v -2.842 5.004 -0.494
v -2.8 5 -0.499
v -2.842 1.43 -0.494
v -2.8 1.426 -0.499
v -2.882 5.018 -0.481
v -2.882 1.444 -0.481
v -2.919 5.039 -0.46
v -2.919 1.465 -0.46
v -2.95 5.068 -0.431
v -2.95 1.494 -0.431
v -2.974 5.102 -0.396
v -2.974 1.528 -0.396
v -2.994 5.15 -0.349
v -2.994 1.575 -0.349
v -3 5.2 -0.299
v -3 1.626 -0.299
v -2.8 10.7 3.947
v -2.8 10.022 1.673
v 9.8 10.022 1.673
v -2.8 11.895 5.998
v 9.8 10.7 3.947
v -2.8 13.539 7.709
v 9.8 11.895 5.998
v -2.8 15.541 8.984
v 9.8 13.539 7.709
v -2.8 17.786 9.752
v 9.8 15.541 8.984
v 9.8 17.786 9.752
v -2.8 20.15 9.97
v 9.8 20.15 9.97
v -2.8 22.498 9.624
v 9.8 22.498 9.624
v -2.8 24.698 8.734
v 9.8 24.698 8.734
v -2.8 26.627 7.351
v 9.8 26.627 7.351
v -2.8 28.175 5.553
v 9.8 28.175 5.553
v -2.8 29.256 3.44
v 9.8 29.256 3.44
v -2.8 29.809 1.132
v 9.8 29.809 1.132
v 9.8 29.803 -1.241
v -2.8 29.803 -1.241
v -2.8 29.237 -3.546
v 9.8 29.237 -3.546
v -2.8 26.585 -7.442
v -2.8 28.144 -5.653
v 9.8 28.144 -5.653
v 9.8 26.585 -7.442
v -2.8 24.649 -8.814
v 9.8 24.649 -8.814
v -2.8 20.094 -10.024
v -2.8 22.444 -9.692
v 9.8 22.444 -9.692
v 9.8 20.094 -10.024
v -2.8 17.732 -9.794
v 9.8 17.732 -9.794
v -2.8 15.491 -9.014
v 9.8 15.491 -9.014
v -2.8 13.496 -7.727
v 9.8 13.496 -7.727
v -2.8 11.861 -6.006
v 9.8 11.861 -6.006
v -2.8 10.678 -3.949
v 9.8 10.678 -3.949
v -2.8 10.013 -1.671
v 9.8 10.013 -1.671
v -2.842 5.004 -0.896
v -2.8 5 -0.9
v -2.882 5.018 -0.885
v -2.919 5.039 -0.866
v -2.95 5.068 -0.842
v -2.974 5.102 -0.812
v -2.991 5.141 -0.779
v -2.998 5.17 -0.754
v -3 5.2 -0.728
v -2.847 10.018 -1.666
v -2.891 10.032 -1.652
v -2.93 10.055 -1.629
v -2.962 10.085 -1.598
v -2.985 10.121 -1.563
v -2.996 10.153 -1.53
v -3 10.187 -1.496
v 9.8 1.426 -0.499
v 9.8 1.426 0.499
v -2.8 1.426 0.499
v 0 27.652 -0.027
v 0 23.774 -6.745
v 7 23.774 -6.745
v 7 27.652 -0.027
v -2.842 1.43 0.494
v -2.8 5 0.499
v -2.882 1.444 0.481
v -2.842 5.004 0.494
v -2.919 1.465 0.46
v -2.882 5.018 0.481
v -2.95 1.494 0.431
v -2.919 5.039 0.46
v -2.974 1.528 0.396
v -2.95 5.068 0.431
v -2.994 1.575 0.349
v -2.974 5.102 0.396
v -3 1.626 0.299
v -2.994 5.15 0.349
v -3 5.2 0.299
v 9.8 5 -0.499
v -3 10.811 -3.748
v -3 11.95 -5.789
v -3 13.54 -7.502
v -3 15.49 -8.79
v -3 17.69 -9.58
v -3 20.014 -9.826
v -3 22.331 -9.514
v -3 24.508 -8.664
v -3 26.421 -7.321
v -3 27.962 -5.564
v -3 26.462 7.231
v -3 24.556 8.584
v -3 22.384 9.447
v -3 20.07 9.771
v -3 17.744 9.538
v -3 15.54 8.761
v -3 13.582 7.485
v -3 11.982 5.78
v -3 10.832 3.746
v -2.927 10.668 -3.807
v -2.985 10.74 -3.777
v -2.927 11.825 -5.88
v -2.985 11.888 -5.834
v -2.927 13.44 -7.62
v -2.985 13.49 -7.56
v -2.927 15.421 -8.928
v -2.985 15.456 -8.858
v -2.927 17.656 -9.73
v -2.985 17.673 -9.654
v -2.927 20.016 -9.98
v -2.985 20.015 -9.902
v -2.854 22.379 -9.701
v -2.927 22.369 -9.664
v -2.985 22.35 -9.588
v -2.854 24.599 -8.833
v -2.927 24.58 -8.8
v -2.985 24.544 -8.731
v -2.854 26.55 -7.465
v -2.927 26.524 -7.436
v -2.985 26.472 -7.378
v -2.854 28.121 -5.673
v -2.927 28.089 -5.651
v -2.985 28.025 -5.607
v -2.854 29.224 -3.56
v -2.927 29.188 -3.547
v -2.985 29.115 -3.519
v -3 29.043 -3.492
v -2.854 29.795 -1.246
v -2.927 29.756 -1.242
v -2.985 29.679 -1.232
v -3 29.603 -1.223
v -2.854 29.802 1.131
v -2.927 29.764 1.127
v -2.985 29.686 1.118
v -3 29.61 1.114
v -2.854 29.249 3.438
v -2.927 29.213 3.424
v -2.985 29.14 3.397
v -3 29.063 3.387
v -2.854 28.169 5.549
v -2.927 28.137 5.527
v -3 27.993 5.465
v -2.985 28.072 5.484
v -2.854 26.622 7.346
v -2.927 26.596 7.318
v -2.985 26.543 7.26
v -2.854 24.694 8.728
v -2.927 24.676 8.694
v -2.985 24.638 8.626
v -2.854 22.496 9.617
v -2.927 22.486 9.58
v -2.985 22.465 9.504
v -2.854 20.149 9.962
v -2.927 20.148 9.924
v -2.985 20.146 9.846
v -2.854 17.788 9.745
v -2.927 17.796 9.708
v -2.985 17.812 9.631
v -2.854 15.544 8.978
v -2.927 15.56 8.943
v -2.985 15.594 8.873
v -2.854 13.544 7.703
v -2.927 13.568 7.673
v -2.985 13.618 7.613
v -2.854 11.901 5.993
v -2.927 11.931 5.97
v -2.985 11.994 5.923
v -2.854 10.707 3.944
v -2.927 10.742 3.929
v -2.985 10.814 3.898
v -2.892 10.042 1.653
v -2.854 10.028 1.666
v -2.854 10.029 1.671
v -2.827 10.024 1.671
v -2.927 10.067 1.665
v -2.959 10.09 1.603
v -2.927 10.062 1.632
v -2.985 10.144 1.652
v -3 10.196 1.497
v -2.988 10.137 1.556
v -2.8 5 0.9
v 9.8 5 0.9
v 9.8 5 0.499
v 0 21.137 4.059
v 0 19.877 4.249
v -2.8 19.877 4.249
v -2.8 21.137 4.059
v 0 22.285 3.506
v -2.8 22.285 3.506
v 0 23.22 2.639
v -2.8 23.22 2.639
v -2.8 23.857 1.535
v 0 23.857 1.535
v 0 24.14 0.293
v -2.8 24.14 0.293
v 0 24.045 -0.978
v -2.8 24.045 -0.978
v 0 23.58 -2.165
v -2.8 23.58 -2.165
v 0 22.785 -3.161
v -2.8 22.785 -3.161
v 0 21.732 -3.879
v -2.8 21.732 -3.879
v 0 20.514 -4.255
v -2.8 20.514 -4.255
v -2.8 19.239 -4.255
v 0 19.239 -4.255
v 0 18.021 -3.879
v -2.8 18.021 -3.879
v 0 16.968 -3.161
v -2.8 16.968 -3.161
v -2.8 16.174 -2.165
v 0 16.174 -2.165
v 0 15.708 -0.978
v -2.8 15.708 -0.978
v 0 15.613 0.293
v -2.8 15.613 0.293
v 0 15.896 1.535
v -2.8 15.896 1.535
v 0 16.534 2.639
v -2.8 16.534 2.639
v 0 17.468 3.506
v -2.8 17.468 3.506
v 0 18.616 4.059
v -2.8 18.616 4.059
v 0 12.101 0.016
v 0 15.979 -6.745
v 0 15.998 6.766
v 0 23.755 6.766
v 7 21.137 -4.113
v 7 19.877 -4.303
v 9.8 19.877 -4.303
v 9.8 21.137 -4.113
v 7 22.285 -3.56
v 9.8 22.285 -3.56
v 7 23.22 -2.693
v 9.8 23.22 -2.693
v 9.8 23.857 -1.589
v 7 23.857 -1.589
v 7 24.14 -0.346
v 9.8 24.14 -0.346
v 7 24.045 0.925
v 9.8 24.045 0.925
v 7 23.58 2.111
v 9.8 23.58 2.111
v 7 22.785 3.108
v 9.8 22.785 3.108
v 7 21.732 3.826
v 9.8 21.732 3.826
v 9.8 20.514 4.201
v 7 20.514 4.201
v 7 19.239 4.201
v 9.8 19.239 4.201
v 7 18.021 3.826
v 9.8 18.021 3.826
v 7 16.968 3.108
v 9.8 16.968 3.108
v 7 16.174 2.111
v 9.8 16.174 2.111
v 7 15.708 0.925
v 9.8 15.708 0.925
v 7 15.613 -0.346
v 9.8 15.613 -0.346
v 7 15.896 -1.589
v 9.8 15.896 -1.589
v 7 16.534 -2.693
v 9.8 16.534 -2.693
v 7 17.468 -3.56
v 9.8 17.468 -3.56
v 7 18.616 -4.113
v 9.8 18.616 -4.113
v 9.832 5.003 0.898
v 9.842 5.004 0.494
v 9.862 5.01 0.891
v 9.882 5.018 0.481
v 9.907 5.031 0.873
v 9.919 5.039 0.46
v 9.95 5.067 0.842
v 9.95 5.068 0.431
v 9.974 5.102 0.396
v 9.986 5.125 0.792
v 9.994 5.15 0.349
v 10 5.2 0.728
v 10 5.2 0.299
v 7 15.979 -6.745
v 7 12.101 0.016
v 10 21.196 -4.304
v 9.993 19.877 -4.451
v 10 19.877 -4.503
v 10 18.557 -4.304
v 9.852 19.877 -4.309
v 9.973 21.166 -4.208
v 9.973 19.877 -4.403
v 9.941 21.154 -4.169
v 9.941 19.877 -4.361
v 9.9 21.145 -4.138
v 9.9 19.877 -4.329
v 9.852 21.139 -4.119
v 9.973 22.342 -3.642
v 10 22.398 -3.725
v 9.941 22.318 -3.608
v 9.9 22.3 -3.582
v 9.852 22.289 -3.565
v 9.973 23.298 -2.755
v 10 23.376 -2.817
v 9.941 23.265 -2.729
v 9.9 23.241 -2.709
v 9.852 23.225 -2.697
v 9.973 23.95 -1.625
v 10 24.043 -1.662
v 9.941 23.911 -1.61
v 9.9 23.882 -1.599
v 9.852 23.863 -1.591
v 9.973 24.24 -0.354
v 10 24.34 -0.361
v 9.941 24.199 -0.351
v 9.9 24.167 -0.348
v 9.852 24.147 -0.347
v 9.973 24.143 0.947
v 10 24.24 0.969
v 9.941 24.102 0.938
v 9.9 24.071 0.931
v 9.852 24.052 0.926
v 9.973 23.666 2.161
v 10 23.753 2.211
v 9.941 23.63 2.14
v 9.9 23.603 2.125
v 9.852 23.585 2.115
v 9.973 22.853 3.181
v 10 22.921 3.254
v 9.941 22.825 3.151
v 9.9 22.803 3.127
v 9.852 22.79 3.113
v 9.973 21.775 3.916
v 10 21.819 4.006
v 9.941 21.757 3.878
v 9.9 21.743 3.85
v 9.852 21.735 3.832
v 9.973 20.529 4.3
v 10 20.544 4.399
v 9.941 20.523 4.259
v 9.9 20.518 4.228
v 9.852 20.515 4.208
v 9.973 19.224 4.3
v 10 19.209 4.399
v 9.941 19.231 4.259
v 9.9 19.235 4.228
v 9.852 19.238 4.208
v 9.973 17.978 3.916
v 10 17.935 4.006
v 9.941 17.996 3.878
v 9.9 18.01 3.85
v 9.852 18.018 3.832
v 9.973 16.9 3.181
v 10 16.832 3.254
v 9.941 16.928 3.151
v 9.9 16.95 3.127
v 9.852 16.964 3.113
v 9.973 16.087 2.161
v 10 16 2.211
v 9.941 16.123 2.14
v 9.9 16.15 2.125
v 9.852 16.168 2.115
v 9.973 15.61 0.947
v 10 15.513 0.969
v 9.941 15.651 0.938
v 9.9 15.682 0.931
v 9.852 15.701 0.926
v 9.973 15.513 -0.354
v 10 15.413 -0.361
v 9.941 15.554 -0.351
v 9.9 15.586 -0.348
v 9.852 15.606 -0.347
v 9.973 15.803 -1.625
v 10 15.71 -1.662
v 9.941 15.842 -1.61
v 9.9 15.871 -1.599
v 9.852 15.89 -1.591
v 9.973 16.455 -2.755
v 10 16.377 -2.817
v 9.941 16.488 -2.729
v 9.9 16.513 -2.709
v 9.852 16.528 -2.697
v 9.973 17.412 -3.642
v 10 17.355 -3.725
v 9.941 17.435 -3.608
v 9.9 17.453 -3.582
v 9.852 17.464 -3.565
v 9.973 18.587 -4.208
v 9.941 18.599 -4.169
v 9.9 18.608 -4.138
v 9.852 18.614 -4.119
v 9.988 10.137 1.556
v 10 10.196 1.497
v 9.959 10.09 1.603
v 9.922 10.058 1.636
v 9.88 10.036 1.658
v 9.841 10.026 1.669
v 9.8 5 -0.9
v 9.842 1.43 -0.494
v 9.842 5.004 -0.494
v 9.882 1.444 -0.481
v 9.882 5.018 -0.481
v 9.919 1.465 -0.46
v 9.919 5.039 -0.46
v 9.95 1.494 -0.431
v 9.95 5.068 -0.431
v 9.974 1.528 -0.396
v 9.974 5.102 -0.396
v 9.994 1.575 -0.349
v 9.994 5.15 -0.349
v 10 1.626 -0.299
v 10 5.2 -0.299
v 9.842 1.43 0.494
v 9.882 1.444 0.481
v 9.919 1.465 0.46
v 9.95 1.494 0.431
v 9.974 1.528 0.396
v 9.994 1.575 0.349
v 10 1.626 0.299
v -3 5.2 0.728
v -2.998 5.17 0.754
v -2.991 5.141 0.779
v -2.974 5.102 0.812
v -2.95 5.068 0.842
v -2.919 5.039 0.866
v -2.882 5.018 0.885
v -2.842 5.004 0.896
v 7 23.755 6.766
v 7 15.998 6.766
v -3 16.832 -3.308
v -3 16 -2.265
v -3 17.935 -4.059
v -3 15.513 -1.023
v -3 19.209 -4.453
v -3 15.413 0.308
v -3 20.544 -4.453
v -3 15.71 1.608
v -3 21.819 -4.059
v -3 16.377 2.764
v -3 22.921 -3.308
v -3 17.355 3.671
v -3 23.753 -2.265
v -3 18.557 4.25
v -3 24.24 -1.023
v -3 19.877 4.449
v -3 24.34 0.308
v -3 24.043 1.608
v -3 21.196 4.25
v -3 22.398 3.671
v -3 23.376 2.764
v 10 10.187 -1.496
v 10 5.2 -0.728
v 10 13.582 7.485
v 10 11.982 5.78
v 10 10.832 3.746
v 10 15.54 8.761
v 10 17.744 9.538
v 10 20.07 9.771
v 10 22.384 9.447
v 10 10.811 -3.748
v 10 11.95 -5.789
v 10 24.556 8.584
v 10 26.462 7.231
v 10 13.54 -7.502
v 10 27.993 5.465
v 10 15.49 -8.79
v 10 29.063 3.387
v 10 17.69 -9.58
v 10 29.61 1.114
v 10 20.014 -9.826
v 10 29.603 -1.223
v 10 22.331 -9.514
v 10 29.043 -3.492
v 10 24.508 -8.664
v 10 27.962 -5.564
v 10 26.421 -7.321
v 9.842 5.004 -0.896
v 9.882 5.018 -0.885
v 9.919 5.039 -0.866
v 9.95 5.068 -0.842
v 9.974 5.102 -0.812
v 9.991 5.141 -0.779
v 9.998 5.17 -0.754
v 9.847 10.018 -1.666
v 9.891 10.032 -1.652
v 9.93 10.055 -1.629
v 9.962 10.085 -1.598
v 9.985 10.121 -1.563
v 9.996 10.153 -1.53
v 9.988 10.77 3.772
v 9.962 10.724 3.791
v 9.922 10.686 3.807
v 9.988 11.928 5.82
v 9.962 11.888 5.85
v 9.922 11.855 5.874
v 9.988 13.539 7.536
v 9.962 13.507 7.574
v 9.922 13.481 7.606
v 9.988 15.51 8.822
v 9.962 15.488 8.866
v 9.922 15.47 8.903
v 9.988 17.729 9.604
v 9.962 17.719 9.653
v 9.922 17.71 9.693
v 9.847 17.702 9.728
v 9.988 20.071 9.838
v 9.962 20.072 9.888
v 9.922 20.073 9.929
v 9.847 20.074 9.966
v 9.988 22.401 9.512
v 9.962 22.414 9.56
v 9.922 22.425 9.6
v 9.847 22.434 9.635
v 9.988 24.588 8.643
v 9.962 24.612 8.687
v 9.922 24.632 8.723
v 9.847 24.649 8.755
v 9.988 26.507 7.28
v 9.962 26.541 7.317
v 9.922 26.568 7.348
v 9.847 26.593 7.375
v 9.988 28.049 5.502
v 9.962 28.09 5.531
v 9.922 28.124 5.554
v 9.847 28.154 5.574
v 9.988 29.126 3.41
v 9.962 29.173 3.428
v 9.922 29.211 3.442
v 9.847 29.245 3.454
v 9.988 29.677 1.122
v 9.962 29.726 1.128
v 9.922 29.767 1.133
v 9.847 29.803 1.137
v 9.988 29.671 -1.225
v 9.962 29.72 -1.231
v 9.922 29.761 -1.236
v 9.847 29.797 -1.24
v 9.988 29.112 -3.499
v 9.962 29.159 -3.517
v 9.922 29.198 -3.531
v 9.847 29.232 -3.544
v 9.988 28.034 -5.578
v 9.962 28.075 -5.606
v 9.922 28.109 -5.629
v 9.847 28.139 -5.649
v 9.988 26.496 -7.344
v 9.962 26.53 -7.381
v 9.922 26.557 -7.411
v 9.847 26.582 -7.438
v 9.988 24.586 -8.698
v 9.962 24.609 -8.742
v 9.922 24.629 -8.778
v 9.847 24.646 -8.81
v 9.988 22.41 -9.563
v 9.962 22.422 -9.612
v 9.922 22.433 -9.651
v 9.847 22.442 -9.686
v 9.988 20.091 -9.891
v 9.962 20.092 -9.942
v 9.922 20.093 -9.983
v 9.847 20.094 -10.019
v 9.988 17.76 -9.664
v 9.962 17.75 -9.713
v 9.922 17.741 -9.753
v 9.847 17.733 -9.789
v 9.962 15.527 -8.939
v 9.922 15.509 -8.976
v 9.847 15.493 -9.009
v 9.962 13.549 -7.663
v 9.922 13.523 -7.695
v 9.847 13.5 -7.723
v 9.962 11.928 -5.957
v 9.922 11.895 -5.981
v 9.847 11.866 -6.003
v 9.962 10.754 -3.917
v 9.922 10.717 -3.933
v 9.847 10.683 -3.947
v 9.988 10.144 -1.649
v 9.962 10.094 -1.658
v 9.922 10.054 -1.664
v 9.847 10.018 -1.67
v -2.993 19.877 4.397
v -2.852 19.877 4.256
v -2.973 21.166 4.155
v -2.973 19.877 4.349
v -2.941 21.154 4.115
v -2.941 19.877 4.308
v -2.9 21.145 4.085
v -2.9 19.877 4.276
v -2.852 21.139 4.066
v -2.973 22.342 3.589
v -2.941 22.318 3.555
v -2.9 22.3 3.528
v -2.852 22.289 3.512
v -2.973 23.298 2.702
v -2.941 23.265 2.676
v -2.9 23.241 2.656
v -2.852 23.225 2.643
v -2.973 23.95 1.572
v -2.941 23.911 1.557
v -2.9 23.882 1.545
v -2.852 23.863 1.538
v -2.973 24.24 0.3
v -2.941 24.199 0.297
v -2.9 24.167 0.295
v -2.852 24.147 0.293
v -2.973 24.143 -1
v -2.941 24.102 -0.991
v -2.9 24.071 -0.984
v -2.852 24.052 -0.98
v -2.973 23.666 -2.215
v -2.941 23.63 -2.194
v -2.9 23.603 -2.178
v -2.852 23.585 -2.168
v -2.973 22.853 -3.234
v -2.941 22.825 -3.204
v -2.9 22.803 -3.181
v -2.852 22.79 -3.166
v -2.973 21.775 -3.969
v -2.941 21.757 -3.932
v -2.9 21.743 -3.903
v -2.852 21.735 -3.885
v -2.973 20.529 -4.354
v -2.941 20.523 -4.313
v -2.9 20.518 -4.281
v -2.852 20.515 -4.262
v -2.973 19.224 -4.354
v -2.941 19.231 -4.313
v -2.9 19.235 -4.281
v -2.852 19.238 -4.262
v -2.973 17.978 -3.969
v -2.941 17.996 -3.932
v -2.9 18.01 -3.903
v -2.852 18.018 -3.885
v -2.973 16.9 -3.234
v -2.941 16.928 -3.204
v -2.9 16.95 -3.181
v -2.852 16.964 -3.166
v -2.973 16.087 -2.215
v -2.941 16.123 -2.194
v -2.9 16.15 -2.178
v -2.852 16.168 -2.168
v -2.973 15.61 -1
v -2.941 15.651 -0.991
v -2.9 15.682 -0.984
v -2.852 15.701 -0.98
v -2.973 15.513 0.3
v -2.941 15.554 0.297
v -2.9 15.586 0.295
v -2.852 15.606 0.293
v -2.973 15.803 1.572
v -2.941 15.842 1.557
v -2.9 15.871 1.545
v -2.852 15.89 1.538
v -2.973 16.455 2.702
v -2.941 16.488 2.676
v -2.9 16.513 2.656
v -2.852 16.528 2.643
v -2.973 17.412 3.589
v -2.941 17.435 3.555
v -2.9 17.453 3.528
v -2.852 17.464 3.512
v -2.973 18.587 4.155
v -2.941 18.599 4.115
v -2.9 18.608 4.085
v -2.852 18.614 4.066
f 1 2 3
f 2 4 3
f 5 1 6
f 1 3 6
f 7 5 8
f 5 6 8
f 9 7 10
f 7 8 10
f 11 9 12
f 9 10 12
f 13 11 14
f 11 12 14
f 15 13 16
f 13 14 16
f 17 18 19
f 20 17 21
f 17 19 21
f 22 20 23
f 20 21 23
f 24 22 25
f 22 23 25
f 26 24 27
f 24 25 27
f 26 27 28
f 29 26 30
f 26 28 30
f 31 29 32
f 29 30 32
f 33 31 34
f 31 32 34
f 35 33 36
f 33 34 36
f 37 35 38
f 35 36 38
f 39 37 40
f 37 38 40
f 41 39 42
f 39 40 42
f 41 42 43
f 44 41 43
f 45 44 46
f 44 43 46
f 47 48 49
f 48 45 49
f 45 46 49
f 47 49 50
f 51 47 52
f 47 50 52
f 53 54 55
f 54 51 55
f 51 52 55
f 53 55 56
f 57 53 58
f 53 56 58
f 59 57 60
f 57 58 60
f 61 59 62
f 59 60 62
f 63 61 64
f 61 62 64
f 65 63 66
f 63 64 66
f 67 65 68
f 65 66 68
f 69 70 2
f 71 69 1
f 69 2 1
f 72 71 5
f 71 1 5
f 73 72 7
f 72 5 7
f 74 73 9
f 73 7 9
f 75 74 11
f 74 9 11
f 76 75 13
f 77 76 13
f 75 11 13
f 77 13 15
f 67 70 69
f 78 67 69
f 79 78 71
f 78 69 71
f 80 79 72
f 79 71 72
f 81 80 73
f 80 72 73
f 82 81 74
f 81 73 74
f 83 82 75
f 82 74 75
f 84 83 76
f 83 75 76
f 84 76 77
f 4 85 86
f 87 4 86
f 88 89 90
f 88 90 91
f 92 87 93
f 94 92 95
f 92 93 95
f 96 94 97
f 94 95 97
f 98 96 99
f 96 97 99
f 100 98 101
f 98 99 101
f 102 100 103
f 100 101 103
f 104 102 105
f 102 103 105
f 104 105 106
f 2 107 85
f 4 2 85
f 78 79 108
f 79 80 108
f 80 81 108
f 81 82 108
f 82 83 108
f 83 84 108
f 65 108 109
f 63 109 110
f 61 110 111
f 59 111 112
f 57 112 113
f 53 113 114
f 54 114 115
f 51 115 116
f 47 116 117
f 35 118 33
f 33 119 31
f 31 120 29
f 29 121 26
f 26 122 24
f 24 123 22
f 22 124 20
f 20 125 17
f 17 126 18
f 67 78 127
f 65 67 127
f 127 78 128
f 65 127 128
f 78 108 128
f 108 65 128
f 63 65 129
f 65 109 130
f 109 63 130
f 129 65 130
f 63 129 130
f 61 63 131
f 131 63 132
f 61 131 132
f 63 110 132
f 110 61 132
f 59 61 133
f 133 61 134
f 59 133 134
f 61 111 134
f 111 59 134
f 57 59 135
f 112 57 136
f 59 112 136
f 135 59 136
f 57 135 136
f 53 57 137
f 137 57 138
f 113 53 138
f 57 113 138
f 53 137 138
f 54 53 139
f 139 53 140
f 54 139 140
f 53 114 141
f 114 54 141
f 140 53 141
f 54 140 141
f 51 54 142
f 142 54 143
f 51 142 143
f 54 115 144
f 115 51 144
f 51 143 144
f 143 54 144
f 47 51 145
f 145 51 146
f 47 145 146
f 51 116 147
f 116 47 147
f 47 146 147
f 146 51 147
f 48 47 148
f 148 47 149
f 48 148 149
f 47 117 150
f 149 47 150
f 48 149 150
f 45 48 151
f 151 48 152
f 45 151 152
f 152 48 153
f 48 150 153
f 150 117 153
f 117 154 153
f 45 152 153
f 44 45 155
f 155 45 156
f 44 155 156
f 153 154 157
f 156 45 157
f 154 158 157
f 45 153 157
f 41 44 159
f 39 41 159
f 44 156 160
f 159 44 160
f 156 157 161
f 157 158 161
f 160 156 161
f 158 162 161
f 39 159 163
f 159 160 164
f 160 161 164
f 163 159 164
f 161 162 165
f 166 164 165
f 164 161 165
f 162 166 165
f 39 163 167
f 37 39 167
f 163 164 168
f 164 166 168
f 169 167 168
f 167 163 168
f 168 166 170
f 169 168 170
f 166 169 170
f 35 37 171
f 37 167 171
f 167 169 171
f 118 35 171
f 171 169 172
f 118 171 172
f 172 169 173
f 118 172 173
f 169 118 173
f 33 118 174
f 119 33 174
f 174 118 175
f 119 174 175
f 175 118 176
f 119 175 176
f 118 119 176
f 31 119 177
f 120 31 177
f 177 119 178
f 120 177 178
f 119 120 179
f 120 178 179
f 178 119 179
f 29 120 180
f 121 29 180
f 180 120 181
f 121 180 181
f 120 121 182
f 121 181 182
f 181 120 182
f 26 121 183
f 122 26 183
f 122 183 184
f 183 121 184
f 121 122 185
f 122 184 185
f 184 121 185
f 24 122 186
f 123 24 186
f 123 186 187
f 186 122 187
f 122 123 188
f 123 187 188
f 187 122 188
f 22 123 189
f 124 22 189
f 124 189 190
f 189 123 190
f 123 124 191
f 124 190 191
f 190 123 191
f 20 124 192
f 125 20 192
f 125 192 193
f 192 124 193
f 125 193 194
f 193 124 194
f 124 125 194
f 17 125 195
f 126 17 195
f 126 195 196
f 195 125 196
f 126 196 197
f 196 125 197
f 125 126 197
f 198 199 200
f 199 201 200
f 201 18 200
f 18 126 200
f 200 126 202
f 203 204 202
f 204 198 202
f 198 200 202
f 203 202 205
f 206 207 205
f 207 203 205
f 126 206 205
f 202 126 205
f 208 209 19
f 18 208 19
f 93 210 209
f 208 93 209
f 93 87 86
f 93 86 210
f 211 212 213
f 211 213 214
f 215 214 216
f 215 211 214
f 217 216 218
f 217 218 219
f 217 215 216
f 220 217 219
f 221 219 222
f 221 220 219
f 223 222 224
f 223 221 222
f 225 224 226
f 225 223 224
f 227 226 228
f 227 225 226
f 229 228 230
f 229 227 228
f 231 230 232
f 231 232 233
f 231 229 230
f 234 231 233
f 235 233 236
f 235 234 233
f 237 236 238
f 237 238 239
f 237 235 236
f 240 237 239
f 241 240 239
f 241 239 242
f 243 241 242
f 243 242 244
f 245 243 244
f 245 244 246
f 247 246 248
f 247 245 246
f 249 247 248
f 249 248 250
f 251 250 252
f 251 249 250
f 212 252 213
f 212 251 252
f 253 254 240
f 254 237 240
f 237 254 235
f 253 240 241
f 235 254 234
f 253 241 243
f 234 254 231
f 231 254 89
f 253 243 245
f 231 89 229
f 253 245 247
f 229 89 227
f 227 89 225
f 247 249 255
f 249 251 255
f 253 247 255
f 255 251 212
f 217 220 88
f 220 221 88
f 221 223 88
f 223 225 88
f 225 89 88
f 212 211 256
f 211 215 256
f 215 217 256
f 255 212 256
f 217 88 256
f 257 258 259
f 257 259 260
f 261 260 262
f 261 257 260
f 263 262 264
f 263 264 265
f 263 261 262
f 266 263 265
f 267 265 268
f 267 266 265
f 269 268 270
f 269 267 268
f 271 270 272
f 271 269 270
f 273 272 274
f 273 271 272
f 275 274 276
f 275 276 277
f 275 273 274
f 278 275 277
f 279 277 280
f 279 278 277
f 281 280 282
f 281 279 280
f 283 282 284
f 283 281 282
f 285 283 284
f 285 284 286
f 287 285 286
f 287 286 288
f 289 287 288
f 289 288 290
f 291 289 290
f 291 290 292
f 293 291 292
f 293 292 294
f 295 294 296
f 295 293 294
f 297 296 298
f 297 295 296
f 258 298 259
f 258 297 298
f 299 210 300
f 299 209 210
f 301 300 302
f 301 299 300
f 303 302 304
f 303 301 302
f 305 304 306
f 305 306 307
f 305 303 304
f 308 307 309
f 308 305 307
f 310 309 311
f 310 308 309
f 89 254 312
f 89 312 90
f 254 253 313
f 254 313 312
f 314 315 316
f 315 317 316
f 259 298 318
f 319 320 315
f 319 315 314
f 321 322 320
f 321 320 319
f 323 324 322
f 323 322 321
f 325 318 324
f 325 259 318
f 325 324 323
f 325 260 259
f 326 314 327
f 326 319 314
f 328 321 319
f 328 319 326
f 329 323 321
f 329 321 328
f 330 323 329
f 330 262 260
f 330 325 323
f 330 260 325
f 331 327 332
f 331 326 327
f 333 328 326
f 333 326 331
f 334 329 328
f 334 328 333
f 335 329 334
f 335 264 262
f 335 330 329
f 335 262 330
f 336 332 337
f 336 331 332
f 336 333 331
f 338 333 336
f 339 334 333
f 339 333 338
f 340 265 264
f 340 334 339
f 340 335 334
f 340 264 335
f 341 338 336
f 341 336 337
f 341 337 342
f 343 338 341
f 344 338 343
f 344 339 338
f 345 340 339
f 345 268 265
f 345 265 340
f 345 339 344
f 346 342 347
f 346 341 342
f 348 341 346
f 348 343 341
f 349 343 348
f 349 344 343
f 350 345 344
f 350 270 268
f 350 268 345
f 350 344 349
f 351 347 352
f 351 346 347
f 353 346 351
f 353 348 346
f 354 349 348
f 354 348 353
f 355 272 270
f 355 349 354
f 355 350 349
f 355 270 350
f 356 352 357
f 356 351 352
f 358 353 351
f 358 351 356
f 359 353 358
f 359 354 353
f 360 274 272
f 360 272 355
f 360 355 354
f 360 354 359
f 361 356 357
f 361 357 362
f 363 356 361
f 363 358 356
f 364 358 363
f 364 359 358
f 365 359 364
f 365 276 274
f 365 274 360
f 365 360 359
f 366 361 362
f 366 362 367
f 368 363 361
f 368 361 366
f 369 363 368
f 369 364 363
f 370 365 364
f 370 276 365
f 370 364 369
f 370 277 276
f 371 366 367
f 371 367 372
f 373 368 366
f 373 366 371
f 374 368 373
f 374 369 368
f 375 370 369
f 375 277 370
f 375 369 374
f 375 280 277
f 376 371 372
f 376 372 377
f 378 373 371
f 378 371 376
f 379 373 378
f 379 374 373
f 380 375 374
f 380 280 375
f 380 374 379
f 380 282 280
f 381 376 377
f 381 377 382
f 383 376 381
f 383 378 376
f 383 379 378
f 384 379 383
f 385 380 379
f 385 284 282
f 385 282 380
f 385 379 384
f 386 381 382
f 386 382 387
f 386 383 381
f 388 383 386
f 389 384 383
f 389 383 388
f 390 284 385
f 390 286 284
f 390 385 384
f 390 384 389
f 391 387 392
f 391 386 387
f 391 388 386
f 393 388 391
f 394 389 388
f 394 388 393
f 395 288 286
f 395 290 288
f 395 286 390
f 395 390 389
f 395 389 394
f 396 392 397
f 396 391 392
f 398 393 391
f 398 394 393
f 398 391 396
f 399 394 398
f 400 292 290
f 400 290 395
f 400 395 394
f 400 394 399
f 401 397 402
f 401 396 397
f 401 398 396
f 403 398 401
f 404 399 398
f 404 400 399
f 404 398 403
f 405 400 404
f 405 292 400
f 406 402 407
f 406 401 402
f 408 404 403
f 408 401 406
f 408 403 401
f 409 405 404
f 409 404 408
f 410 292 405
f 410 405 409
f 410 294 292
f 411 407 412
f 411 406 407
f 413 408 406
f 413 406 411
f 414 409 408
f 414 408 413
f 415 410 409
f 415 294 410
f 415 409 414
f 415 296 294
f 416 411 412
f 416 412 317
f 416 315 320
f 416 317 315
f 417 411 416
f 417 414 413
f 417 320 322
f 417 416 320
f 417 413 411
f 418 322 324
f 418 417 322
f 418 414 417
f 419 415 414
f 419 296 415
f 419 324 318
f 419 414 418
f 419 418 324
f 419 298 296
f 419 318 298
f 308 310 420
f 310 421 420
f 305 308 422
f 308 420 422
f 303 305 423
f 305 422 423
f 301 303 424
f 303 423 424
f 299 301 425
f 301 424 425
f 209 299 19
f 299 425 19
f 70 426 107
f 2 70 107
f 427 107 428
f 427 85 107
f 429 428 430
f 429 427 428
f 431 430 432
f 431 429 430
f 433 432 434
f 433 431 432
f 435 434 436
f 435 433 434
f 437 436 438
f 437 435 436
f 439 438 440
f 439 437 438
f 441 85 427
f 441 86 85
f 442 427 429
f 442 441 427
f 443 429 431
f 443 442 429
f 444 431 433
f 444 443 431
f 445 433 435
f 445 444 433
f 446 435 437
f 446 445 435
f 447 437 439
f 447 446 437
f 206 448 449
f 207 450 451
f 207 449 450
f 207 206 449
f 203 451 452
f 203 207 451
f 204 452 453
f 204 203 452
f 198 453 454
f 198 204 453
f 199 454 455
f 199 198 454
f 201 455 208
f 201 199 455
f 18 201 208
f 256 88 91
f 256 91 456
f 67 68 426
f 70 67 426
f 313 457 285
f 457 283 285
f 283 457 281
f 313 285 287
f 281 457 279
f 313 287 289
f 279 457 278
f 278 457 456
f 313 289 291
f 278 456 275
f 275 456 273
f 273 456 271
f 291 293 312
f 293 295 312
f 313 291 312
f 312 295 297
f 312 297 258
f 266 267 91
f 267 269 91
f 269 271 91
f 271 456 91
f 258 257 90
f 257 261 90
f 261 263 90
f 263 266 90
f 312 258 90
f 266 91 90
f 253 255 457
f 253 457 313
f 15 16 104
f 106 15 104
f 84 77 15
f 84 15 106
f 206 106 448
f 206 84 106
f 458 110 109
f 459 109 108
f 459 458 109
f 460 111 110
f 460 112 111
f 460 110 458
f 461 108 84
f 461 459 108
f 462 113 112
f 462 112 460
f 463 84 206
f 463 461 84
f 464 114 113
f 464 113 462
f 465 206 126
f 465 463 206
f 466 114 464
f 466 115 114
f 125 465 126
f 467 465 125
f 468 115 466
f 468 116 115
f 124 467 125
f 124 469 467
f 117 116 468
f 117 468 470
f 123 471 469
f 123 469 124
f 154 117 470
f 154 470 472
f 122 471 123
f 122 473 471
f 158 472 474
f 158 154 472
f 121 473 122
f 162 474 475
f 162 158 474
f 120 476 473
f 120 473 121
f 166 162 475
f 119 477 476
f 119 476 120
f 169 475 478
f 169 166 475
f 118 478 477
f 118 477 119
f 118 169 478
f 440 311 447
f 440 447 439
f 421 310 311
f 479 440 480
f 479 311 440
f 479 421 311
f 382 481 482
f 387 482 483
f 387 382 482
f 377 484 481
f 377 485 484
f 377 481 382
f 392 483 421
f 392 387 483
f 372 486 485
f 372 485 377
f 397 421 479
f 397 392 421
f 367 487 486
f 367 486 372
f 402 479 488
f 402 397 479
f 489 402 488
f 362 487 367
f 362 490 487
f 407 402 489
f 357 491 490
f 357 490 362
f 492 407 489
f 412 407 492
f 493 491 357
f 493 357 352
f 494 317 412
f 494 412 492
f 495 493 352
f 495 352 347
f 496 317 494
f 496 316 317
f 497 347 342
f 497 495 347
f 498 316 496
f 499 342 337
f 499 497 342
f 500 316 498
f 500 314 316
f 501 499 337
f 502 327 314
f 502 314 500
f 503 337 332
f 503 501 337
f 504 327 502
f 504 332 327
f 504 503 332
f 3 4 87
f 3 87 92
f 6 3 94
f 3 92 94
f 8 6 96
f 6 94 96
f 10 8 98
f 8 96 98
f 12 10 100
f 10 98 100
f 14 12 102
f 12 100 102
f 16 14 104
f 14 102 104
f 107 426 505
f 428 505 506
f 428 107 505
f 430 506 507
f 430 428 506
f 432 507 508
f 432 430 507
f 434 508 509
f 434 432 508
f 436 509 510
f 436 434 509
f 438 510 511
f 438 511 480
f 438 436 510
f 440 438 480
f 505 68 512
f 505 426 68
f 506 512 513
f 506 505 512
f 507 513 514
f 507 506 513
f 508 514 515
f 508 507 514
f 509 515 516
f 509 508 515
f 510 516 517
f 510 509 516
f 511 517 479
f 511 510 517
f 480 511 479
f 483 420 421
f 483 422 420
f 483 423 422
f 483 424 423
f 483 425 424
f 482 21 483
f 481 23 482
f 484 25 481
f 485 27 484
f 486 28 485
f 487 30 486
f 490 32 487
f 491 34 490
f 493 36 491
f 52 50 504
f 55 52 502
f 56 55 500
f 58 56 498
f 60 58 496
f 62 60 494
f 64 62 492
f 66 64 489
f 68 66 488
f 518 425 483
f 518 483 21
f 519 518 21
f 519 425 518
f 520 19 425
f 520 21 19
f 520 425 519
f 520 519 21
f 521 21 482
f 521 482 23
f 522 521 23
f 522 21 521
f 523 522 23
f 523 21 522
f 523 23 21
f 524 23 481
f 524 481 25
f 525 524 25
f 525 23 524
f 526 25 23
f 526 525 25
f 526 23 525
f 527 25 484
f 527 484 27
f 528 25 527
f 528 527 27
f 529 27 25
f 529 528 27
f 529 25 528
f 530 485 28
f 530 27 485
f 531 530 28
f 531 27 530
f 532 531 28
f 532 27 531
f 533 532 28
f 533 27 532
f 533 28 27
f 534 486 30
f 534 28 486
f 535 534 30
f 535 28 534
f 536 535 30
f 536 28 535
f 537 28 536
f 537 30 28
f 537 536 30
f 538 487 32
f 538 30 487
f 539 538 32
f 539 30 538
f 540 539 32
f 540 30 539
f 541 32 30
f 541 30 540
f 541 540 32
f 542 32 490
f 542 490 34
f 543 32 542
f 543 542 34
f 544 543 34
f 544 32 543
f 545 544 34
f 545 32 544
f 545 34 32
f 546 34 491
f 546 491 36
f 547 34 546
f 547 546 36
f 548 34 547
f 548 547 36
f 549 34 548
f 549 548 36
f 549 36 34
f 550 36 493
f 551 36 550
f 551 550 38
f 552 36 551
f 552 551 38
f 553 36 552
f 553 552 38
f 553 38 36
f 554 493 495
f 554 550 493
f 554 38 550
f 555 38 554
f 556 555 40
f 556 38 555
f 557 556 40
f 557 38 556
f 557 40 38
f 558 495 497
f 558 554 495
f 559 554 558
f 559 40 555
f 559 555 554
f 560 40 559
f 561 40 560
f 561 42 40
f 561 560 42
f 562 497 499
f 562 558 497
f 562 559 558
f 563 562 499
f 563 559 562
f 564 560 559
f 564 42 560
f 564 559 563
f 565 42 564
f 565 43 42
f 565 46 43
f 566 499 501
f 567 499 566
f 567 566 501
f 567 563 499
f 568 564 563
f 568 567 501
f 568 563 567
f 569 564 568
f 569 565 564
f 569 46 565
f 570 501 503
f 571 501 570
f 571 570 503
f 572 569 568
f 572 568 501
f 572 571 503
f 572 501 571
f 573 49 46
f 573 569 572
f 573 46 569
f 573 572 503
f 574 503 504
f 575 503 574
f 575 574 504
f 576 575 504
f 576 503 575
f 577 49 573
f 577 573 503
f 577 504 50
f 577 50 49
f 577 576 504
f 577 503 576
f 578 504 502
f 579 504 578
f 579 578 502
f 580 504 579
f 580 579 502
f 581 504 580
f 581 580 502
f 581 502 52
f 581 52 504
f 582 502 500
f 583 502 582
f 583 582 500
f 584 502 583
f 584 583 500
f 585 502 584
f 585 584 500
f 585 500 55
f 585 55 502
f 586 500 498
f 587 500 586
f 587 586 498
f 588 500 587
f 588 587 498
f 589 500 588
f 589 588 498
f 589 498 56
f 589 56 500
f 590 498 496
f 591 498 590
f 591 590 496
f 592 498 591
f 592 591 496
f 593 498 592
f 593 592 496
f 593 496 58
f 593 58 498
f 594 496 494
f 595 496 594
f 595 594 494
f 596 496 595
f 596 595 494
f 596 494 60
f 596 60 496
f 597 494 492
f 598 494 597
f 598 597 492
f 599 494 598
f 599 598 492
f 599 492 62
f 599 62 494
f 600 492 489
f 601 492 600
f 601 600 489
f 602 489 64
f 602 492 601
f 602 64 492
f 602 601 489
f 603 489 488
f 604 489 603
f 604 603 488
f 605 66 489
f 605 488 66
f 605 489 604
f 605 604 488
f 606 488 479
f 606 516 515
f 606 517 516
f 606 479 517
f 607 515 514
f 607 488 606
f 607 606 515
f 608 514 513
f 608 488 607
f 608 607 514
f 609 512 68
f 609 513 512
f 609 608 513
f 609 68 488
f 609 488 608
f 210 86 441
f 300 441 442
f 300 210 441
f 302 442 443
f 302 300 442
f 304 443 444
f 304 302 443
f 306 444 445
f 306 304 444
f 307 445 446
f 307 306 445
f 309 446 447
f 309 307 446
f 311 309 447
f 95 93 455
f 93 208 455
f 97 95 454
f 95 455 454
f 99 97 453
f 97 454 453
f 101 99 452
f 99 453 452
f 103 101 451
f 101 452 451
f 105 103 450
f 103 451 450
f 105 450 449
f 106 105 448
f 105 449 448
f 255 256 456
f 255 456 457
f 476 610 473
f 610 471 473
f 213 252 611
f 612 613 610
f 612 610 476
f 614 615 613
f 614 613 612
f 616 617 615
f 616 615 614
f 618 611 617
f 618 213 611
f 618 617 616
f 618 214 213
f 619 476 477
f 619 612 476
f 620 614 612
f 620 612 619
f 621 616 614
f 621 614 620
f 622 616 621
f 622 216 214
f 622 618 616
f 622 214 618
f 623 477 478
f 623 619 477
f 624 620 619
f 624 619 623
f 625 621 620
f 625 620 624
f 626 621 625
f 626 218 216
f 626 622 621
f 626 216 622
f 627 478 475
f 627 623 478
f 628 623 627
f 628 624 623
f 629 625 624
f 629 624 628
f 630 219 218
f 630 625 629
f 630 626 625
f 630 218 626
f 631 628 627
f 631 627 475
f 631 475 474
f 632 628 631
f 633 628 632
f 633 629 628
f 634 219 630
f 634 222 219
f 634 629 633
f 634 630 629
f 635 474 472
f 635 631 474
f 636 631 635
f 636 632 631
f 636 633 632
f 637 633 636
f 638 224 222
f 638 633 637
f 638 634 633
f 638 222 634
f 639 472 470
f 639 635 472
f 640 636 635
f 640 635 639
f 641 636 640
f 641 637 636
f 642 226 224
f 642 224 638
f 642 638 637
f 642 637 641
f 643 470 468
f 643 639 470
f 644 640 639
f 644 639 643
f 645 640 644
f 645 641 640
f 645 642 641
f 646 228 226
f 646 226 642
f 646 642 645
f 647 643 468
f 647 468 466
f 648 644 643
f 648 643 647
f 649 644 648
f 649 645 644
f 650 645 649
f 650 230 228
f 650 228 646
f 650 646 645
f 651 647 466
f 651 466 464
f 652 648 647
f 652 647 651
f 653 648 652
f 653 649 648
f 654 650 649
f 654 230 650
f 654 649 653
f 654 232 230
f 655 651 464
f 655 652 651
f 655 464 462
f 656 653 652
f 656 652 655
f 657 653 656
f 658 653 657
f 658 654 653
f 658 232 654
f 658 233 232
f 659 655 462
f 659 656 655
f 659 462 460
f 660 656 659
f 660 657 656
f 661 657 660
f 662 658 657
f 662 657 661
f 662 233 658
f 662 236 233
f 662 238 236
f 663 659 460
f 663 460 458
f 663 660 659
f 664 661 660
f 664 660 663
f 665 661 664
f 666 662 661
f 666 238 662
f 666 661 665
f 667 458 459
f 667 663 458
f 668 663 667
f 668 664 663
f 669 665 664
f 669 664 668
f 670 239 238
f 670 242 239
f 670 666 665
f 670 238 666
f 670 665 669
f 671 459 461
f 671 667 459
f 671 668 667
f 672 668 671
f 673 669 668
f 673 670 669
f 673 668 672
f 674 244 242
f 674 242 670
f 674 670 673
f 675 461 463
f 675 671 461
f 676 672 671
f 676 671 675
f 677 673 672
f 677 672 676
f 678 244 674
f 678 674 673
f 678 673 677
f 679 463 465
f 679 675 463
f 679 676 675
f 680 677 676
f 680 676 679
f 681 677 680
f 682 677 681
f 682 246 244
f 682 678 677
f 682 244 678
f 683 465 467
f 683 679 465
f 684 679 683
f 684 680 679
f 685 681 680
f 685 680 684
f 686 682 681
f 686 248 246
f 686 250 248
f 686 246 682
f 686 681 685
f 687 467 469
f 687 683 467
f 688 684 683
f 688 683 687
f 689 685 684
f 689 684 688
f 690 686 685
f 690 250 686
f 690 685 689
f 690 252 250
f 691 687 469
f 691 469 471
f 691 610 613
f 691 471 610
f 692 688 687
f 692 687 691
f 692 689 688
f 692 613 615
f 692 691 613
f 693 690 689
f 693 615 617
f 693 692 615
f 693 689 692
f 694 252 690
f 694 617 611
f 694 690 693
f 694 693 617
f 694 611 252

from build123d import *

# Parameters (mm, degrees)
BOSS_EXTRUDE1_DEPTH      = 10
BOSS_EXTRUDE1_DEPTH_BACK = 3
SKETCH3_R                = 10
BOSS_EXTRUDE2_DEPTH      = 7
SKETCH4_R                = 10
SKETCH4_R_2              = 4.275866884
BOSS_EXTRUDE3_DEPTH      = 3
BOSS_EXTRUDE5_START      = 3
SKETCH5_R                = 10
SKETCH5_R_2              = 4.275866884
BOSS_EXTRUDE5_DEPTH      = 3
FILLET1_R                = 0.2


with BuildPart() as part:
    # Sketch1 → Boss-Extrude1 (new, two sides: drawn at the far end of the back side and taken through both)
    with BuildSketch(Plane(origin=(0, 0, 0), x_dir=(0, 0, -1), z_dir=(1, 0, 0)).offset(-BOSS_EXTRUDE1_DEPTH_BACK)):
        Polygon((-0.9, 5), (-1.9, 11.5), (1.9, 11.5), (0.9, 5), (0.49863691, 5), (0.49863691, 1.42579855), (-0.49863691, 1.42579855), (-0.49863691, 5), align=None)
    extrude(amount=BOSS_EXTRUDE1_DEPTH + BOSS_EXTRUDE1_DEPTH_BACK)

    # Sketch4 → Boss-Extrude3 (add)
    with BuildSketch(Plane(origin=(7, 0, 0), x_dir=(0, 0, -1), z_dir=(1, 0, 0))):
        with Locations((0.02673714, 19.876573363)):
            Circle(SKETCH4_R)
        with Locations((0.02673714, 19.876573363)):
            Circle(SKETCH4_R_2, mode=Mode.SUBTRACT)
    extrude(amount=BOSS_EXTRUDE3_DEPTH)

    # Sketch5 → Boss-Extrude5 (add)
    with BuildSketch(Plane.ZY.offset(BOSS_EXTRUDE5_START)):
        with Locations((-0.02673714, 19.876573363)):
            Circle(SKETCH5_R)
        with Locations((-0.02673714, 19.876573363)):
            Circle(SKETCH5_R_2, mode=Mode.SUBTRACT)
    extrude(amount=-BOSS_EXTRUDE5_DEPTH)

    # Fillet1
    fillet1_edges = [part.edges().sort_by_distance(p)[0] for p in [
        (10, 19.876573363, 4.249129744),
        (10, 5, -0.699318455),
        (10, 3.212899275, -0.49863691),
        (10, 1.42579855, 0),
        (10, 3.212899275, 0.49863691),
        (10, 5, 0.699318455),
        (10, 7.511010819, 1.286309357),
        (10, 29.876534594, -0.054582443),
        (10, 7.506355338, -1.285593129),
        (-3, 19.876573363, -4.302604024),
        (-3, 5, 0.699318455),
        (-3, 3.212899275, 0.49863691),
        (-3, 1.42579855, 0),
        (-3, 3.212899275, -0.49863691),
        (-3, 5, -0.699318455),
        (-3, 7.506355338, -1.285593129),
        (-3, 29.876534594, -0.054582443),
        (-3, 7.511010819, 1.286309357),
    ]]
    fillet(fillet1_edges, radius=FILLET1_R)


with BuildPart() as body_2:
    # Sketch3 → Boss-Extrude2 (new body)
    with BuildSketch(Plane(origin=(0, 0, 0), x_dir=(0, 0, -1), z_dir=(1, 0, 0))):
        with Locations((0.02673714, 19.876573363)):
            Circle(SKETCH3_R)
        Polygon((-6.765606496, 23.75539232), (-6.765606496, 15.997772407), (-0.015606496, 12.10065809), (6.744933656, 15.979459046), (6.744933656, 23.77368768), (0.02673714, 27.652440247), align=None, mode=Mode.SUBTRACT)
    extrude(amount=BOSS_EXTRUDE2_DEPTH)

    # Combine1: union part
    add(part.part)


solid = body_2.part
